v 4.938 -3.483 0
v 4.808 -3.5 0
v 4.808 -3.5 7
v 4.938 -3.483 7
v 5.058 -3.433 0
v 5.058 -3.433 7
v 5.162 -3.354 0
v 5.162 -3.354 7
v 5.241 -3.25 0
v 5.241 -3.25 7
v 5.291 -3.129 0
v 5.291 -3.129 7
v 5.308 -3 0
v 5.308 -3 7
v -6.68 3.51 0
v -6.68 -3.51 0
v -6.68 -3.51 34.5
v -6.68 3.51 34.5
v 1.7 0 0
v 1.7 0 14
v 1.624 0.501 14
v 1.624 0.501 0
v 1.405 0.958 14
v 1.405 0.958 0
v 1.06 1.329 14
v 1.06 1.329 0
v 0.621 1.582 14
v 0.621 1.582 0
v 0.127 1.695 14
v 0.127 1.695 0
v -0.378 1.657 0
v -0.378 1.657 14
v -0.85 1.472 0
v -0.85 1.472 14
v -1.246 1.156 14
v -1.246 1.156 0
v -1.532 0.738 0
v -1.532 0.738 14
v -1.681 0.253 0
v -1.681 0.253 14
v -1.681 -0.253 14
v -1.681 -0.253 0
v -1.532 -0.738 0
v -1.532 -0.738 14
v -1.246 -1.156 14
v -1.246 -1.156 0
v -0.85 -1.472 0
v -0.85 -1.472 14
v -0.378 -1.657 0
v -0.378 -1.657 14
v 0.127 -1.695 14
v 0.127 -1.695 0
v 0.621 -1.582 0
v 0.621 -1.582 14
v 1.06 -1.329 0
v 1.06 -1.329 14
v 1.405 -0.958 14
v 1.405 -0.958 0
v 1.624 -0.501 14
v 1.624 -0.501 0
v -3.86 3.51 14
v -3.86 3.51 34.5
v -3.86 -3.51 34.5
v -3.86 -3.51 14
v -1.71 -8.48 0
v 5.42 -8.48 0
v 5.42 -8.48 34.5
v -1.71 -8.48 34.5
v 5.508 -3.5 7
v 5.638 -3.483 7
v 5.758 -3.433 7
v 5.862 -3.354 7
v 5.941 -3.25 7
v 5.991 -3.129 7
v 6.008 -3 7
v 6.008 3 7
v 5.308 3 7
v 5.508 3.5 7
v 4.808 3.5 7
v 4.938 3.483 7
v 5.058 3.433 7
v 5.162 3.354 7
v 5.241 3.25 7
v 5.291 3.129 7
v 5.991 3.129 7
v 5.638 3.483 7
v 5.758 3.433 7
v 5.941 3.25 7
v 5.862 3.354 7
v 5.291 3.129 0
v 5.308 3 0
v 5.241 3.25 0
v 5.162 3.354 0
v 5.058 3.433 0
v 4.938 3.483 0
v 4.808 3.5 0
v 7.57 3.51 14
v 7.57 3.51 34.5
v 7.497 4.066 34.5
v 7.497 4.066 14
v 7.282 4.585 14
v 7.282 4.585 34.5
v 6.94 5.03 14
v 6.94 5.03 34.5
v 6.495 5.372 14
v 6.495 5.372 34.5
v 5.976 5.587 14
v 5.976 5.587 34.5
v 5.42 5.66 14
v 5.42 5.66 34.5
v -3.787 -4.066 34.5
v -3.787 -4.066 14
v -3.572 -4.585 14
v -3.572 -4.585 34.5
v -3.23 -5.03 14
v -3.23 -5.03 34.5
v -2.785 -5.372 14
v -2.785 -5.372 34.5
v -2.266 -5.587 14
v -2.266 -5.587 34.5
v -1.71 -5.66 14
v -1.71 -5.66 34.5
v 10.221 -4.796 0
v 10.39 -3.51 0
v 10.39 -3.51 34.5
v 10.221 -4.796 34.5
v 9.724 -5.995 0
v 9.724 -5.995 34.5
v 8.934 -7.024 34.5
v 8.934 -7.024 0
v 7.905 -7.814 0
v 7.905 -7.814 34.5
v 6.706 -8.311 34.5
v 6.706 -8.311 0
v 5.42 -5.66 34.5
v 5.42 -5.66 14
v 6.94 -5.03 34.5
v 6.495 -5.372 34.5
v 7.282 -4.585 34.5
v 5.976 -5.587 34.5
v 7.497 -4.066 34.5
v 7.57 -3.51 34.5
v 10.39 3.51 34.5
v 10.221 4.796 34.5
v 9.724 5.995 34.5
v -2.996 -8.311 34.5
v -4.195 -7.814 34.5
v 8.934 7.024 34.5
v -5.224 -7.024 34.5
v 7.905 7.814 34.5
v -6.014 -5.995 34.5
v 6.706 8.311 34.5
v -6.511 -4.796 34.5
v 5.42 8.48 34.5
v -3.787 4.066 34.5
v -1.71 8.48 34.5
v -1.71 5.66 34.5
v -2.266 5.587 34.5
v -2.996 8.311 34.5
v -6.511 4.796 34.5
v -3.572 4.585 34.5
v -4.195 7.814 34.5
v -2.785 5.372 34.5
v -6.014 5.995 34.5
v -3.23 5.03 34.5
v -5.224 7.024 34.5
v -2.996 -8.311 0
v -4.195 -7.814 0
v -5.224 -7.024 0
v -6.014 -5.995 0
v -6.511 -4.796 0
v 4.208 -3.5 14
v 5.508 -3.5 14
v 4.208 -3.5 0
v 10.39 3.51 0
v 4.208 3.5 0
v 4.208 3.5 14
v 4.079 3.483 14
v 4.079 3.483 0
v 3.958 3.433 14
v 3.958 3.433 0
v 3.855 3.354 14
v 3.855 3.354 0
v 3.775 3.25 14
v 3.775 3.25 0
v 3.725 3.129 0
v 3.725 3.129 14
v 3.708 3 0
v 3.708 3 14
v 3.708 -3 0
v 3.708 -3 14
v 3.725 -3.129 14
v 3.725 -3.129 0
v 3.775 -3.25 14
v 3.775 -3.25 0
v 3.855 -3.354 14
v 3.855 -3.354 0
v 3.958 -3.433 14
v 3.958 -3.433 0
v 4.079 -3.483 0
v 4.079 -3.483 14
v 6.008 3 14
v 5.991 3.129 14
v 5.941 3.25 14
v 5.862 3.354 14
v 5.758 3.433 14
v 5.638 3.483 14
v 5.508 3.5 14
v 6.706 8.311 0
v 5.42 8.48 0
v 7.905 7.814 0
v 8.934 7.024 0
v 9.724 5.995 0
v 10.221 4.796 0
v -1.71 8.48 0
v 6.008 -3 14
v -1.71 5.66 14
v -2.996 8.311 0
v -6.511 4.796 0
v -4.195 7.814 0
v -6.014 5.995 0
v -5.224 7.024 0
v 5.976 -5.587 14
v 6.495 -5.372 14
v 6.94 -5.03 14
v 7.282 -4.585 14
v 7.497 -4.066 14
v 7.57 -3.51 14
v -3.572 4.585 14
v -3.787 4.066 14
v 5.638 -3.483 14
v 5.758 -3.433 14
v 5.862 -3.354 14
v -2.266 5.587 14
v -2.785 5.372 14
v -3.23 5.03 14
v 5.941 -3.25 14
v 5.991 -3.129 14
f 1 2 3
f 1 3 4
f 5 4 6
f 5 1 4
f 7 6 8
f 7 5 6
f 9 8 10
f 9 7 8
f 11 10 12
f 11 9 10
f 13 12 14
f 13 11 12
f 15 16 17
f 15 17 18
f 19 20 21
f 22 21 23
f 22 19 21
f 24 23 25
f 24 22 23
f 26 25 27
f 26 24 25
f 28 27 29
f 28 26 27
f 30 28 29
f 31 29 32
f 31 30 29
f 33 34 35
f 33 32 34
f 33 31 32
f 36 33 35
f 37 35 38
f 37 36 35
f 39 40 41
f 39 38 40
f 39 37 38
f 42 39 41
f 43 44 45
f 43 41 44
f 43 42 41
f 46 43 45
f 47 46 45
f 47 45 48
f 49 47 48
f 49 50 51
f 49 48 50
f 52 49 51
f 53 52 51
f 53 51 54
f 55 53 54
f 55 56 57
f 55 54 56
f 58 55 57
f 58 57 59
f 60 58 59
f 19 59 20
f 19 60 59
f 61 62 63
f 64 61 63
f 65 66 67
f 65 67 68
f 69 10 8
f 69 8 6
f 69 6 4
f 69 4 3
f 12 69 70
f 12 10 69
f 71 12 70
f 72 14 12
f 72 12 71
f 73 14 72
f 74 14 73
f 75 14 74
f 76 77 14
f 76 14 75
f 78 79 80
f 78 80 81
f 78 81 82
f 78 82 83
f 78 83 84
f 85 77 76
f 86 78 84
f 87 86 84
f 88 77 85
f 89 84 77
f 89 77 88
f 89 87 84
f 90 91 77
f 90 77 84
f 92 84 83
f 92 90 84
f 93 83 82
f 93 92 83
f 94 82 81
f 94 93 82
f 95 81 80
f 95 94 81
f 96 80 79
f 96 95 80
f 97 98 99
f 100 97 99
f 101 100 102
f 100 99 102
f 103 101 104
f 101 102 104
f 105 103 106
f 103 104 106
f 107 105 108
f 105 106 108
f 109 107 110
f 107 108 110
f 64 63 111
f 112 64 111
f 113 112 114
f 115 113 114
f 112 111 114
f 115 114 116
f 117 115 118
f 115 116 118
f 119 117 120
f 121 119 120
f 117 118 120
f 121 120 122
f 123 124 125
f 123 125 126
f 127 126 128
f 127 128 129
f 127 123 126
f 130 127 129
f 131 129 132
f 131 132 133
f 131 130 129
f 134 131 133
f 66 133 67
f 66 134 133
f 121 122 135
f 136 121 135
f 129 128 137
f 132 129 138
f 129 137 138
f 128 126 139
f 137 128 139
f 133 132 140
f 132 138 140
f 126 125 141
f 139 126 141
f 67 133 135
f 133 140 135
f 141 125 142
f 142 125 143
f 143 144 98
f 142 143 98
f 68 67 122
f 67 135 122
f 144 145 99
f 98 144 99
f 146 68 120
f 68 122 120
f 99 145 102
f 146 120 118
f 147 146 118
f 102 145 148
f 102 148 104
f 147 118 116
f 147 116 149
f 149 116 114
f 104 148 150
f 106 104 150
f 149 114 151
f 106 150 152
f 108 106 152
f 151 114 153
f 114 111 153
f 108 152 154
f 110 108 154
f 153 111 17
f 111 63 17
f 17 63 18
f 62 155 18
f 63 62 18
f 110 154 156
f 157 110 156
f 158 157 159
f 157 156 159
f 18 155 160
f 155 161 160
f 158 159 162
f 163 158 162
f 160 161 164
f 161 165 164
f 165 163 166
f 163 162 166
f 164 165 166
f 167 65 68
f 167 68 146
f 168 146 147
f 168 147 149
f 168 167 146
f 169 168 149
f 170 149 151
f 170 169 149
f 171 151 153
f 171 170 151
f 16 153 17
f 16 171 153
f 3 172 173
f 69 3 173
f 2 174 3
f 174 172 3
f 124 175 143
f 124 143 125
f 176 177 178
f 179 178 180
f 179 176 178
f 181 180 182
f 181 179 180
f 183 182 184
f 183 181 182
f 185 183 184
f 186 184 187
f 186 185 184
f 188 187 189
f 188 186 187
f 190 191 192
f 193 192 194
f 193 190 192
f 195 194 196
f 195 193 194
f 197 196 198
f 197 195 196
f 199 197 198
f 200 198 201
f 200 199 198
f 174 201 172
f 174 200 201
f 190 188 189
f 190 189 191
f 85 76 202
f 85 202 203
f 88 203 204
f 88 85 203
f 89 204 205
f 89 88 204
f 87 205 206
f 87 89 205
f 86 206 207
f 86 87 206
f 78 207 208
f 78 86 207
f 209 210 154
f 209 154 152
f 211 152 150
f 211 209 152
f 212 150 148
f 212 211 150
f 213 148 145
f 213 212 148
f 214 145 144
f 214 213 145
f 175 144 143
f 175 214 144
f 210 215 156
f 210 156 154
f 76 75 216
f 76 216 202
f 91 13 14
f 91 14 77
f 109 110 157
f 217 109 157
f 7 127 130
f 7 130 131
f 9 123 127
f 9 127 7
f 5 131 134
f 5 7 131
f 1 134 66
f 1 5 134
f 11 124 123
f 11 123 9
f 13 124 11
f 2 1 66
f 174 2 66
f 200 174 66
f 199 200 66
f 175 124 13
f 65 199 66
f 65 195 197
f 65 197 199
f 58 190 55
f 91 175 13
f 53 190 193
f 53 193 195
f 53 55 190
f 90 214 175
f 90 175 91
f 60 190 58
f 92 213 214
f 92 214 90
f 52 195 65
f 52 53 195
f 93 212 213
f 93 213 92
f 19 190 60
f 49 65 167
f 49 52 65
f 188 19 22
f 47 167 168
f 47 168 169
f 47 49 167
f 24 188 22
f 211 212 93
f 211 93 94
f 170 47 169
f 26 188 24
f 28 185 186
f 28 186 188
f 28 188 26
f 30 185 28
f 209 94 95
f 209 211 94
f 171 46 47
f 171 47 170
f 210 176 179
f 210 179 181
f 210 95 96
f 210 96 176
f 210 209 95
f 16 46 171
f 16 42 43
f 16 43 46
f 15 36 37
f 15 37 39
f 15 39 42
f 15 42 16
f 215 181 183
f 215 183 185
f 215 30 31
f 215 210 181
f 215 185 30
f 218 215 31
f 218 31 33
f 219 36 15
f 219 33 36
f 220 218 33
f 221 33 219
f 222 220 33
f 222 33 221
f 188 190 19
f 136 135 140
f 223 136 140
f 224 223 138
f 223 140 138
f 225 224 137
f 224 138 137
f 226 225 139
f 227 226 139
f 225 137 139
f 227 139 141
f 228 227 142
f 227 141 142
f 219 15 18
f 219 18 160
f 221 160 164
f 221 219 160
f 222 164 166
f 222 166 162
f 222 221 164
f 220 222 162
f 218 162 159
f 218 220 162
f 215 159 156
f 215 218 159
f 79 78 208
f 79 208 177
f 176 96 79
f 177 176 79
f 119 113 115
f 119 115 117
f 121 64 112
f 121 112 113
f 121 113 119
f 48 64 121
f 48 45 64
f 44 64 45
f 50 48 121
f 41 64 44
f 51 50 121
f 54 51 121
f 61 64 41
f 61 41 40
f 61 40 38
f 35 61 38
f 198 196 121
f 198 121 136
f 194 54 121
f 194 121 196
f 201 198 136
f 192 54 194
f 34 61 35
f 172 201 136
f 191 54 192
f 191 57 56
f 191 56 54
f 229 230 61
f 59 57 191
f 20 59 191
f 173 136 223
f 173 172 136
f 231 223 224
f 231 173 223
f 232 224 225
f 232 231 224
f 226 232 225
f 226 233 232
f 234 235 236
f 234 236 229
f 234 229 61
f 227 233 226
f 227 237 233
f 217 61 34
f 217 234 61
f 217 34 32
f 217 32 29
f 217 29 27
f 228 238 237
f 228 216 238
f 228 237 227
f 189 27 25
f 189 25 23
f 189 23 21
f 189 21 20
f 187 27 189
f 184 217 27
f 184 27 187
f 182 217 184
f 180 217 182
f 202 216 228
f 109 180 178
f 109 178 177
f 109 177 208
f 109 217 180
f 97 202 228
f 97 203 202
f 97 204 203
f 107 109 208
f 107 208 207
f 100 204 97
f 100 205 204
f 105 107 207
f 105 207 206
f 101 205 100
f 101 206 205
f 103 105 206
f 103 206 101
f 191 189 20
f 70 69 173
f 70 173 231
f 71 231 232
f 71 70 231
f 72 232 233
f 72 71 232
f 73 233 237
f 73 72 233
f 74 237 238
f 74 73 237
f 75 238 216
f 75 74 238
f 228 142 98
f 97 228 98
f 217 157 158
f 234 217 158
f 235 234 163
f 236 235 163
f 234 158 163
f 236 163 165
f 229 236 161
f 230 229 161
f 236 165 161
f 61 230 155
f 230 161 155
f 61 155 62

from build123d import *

# Parameters (mm, degrees)
SKETCH1_R           = 1.7
BOSS_EXTRUDE1_DEPTH = 34.5
CUT_EXTRUDE1_DEPTH  = 20.5
CUT_EXTRUDE2_START  = -7
CUT_EXTRUDE2_DEPTH  = 7


with BuildPart() as part:
    # Sketch1 → Boss-Extrude1 (new body)
    with BuildSketch(Plane.XY):
        with BuildLine():
            Line((-1.71, 8.48), (5.42, 8.48))
            ThreePointArc((5.42, 8.48), (8.934320702, 7.024320703), (10.39, 3.51))
            Line((10.39, 3.51), (10.39, -3.510005593))
            ThreePointArc((10.39, -3.510005593), (8.934320702, -7.024326295), (5.42, -8.480005593))
            Line((5.42, -8.480005593), (-1.71, -8.480005593))
            ThreePointArc((-1.71, -8.480005593), (-5.224320703, -7.024326295), (-6.68, -3.510005593))
            Line((-6.68, -3.510005593), (-6.68, 3.51))
            ThreePointArc((-6.68, 3.51), (-5.224320703, 7.024320703), (-1.71, 8.48))
        make_face()
        Circle(SKETCH1_R, mode=Mode.SUBTRACT)
        with BuildLine():
            Line((3.708402898, 2.999994407), (3.708402898, -2.999994407))
            ThreePointArc((3.708402898, -2.999994407), (3.854849507, -3.353547798), (4.208402898, -3.499994407))
            Line((4.208402898, -3.499994407), (4.808402898, -3.499994407))
            ThreePointArc((4.808402898, -3.499994407), (5.161956288, -3.353547798), (5.308402898, -2.999994407))
            Line((5.308402898, -2.999994407), (5.308402898, 2.999994407))
            ThreePointArc((5.308402898, 2.999994407), (5.161956288, 3.353547798), (4.808402898, 3.499994407))
            Line((4.808402898, 3.499994407), (4.208402898, 3.499994407))
            ThreePointArc((4.208402898, 3.499994407), (3.854849507, 3.353547798), (3.708402898, 2.999994407))
        make_face(mode=Mode.SUBTRACT)
    extrude(amount=BOSS_EXTRUDE1_DEPTH)

    # Sketch2 → Cut-Extrude1 (cut)
    with BuildSketch(Plane.XY.offset(34.5)):
        with BuildLine():
            Line((7.57000536, -3.509982547), (7.56999464, 3.510017453))
            ThreePointArc((7.56999464, 3.510017453), (6.94026805, 5.03028575), (5.419994641, 5.66))
            Line((5.419994641, 5.66), (-1.71000536, 5.66))
            ThreePointArc((-1.71000536, 5.66), (-3.230284939, 5.03027958), (-3.86000536, 3.51))
            Line((-3.86000536, 3.51), (-3.85999464, -3.51))
            ThreePointArc((-3.85999464, -3.51), (-3.230271899, -5.030278618), (-1.709991358, -5.659996717))
            Line((-1.709991358, -5.659996717), (5.420008642, -5.65998583))
            ThreePointArc((5.420008642, -5.65998583), (6.94028726, -5.030263088), (7.57000536, -3.509982547))
        make_face()
    extrude(amount=-CUT_EXTRUDE1_DEPTH, mode=Mode.SUBTRACT)

    # Sketch3 → Cut-Extrude2 (cut)
    with BuildSketch(Plane.XY.offset(14).offset(CUT_EXTRUDE2_START)):
        with BuildLine():
            Line((5.508402898, 3.499994407), (4.208402898, 3.499994407))
            ThreePointArc((4.208402898, 3.499994407), (3.854849507, 3.353547798), (3.708402898, 2.999994407))
            Line((3.708402898, 2.999994407), (3.708402898, -2.999994407))
            ThreePointArc((3.708402898, -2.999994407), (3.854849507, -3.353547798), (4.208402898, -3.499994407))
            Line((4.208402898, -3.499994407), (5.508402898, -3.499994407))
            ThreePointArc((5.508402898, -3.499994407), (5.861956288, -3.353547798), (6.008402898, -2.999994407))
            Line((6.008402898, -2.999994407), (6.008402898, 2.999994407))
            ThreePointArc((6.008402898, 2.999994407), (5.861956288, 3.353547798), (5.508402898, 3.499994407))
        make_face()
    extrude(amount=CUT_EXTRUDE2_DEPTH, mode=Mode.SUBTRACT)


solid = part.part
